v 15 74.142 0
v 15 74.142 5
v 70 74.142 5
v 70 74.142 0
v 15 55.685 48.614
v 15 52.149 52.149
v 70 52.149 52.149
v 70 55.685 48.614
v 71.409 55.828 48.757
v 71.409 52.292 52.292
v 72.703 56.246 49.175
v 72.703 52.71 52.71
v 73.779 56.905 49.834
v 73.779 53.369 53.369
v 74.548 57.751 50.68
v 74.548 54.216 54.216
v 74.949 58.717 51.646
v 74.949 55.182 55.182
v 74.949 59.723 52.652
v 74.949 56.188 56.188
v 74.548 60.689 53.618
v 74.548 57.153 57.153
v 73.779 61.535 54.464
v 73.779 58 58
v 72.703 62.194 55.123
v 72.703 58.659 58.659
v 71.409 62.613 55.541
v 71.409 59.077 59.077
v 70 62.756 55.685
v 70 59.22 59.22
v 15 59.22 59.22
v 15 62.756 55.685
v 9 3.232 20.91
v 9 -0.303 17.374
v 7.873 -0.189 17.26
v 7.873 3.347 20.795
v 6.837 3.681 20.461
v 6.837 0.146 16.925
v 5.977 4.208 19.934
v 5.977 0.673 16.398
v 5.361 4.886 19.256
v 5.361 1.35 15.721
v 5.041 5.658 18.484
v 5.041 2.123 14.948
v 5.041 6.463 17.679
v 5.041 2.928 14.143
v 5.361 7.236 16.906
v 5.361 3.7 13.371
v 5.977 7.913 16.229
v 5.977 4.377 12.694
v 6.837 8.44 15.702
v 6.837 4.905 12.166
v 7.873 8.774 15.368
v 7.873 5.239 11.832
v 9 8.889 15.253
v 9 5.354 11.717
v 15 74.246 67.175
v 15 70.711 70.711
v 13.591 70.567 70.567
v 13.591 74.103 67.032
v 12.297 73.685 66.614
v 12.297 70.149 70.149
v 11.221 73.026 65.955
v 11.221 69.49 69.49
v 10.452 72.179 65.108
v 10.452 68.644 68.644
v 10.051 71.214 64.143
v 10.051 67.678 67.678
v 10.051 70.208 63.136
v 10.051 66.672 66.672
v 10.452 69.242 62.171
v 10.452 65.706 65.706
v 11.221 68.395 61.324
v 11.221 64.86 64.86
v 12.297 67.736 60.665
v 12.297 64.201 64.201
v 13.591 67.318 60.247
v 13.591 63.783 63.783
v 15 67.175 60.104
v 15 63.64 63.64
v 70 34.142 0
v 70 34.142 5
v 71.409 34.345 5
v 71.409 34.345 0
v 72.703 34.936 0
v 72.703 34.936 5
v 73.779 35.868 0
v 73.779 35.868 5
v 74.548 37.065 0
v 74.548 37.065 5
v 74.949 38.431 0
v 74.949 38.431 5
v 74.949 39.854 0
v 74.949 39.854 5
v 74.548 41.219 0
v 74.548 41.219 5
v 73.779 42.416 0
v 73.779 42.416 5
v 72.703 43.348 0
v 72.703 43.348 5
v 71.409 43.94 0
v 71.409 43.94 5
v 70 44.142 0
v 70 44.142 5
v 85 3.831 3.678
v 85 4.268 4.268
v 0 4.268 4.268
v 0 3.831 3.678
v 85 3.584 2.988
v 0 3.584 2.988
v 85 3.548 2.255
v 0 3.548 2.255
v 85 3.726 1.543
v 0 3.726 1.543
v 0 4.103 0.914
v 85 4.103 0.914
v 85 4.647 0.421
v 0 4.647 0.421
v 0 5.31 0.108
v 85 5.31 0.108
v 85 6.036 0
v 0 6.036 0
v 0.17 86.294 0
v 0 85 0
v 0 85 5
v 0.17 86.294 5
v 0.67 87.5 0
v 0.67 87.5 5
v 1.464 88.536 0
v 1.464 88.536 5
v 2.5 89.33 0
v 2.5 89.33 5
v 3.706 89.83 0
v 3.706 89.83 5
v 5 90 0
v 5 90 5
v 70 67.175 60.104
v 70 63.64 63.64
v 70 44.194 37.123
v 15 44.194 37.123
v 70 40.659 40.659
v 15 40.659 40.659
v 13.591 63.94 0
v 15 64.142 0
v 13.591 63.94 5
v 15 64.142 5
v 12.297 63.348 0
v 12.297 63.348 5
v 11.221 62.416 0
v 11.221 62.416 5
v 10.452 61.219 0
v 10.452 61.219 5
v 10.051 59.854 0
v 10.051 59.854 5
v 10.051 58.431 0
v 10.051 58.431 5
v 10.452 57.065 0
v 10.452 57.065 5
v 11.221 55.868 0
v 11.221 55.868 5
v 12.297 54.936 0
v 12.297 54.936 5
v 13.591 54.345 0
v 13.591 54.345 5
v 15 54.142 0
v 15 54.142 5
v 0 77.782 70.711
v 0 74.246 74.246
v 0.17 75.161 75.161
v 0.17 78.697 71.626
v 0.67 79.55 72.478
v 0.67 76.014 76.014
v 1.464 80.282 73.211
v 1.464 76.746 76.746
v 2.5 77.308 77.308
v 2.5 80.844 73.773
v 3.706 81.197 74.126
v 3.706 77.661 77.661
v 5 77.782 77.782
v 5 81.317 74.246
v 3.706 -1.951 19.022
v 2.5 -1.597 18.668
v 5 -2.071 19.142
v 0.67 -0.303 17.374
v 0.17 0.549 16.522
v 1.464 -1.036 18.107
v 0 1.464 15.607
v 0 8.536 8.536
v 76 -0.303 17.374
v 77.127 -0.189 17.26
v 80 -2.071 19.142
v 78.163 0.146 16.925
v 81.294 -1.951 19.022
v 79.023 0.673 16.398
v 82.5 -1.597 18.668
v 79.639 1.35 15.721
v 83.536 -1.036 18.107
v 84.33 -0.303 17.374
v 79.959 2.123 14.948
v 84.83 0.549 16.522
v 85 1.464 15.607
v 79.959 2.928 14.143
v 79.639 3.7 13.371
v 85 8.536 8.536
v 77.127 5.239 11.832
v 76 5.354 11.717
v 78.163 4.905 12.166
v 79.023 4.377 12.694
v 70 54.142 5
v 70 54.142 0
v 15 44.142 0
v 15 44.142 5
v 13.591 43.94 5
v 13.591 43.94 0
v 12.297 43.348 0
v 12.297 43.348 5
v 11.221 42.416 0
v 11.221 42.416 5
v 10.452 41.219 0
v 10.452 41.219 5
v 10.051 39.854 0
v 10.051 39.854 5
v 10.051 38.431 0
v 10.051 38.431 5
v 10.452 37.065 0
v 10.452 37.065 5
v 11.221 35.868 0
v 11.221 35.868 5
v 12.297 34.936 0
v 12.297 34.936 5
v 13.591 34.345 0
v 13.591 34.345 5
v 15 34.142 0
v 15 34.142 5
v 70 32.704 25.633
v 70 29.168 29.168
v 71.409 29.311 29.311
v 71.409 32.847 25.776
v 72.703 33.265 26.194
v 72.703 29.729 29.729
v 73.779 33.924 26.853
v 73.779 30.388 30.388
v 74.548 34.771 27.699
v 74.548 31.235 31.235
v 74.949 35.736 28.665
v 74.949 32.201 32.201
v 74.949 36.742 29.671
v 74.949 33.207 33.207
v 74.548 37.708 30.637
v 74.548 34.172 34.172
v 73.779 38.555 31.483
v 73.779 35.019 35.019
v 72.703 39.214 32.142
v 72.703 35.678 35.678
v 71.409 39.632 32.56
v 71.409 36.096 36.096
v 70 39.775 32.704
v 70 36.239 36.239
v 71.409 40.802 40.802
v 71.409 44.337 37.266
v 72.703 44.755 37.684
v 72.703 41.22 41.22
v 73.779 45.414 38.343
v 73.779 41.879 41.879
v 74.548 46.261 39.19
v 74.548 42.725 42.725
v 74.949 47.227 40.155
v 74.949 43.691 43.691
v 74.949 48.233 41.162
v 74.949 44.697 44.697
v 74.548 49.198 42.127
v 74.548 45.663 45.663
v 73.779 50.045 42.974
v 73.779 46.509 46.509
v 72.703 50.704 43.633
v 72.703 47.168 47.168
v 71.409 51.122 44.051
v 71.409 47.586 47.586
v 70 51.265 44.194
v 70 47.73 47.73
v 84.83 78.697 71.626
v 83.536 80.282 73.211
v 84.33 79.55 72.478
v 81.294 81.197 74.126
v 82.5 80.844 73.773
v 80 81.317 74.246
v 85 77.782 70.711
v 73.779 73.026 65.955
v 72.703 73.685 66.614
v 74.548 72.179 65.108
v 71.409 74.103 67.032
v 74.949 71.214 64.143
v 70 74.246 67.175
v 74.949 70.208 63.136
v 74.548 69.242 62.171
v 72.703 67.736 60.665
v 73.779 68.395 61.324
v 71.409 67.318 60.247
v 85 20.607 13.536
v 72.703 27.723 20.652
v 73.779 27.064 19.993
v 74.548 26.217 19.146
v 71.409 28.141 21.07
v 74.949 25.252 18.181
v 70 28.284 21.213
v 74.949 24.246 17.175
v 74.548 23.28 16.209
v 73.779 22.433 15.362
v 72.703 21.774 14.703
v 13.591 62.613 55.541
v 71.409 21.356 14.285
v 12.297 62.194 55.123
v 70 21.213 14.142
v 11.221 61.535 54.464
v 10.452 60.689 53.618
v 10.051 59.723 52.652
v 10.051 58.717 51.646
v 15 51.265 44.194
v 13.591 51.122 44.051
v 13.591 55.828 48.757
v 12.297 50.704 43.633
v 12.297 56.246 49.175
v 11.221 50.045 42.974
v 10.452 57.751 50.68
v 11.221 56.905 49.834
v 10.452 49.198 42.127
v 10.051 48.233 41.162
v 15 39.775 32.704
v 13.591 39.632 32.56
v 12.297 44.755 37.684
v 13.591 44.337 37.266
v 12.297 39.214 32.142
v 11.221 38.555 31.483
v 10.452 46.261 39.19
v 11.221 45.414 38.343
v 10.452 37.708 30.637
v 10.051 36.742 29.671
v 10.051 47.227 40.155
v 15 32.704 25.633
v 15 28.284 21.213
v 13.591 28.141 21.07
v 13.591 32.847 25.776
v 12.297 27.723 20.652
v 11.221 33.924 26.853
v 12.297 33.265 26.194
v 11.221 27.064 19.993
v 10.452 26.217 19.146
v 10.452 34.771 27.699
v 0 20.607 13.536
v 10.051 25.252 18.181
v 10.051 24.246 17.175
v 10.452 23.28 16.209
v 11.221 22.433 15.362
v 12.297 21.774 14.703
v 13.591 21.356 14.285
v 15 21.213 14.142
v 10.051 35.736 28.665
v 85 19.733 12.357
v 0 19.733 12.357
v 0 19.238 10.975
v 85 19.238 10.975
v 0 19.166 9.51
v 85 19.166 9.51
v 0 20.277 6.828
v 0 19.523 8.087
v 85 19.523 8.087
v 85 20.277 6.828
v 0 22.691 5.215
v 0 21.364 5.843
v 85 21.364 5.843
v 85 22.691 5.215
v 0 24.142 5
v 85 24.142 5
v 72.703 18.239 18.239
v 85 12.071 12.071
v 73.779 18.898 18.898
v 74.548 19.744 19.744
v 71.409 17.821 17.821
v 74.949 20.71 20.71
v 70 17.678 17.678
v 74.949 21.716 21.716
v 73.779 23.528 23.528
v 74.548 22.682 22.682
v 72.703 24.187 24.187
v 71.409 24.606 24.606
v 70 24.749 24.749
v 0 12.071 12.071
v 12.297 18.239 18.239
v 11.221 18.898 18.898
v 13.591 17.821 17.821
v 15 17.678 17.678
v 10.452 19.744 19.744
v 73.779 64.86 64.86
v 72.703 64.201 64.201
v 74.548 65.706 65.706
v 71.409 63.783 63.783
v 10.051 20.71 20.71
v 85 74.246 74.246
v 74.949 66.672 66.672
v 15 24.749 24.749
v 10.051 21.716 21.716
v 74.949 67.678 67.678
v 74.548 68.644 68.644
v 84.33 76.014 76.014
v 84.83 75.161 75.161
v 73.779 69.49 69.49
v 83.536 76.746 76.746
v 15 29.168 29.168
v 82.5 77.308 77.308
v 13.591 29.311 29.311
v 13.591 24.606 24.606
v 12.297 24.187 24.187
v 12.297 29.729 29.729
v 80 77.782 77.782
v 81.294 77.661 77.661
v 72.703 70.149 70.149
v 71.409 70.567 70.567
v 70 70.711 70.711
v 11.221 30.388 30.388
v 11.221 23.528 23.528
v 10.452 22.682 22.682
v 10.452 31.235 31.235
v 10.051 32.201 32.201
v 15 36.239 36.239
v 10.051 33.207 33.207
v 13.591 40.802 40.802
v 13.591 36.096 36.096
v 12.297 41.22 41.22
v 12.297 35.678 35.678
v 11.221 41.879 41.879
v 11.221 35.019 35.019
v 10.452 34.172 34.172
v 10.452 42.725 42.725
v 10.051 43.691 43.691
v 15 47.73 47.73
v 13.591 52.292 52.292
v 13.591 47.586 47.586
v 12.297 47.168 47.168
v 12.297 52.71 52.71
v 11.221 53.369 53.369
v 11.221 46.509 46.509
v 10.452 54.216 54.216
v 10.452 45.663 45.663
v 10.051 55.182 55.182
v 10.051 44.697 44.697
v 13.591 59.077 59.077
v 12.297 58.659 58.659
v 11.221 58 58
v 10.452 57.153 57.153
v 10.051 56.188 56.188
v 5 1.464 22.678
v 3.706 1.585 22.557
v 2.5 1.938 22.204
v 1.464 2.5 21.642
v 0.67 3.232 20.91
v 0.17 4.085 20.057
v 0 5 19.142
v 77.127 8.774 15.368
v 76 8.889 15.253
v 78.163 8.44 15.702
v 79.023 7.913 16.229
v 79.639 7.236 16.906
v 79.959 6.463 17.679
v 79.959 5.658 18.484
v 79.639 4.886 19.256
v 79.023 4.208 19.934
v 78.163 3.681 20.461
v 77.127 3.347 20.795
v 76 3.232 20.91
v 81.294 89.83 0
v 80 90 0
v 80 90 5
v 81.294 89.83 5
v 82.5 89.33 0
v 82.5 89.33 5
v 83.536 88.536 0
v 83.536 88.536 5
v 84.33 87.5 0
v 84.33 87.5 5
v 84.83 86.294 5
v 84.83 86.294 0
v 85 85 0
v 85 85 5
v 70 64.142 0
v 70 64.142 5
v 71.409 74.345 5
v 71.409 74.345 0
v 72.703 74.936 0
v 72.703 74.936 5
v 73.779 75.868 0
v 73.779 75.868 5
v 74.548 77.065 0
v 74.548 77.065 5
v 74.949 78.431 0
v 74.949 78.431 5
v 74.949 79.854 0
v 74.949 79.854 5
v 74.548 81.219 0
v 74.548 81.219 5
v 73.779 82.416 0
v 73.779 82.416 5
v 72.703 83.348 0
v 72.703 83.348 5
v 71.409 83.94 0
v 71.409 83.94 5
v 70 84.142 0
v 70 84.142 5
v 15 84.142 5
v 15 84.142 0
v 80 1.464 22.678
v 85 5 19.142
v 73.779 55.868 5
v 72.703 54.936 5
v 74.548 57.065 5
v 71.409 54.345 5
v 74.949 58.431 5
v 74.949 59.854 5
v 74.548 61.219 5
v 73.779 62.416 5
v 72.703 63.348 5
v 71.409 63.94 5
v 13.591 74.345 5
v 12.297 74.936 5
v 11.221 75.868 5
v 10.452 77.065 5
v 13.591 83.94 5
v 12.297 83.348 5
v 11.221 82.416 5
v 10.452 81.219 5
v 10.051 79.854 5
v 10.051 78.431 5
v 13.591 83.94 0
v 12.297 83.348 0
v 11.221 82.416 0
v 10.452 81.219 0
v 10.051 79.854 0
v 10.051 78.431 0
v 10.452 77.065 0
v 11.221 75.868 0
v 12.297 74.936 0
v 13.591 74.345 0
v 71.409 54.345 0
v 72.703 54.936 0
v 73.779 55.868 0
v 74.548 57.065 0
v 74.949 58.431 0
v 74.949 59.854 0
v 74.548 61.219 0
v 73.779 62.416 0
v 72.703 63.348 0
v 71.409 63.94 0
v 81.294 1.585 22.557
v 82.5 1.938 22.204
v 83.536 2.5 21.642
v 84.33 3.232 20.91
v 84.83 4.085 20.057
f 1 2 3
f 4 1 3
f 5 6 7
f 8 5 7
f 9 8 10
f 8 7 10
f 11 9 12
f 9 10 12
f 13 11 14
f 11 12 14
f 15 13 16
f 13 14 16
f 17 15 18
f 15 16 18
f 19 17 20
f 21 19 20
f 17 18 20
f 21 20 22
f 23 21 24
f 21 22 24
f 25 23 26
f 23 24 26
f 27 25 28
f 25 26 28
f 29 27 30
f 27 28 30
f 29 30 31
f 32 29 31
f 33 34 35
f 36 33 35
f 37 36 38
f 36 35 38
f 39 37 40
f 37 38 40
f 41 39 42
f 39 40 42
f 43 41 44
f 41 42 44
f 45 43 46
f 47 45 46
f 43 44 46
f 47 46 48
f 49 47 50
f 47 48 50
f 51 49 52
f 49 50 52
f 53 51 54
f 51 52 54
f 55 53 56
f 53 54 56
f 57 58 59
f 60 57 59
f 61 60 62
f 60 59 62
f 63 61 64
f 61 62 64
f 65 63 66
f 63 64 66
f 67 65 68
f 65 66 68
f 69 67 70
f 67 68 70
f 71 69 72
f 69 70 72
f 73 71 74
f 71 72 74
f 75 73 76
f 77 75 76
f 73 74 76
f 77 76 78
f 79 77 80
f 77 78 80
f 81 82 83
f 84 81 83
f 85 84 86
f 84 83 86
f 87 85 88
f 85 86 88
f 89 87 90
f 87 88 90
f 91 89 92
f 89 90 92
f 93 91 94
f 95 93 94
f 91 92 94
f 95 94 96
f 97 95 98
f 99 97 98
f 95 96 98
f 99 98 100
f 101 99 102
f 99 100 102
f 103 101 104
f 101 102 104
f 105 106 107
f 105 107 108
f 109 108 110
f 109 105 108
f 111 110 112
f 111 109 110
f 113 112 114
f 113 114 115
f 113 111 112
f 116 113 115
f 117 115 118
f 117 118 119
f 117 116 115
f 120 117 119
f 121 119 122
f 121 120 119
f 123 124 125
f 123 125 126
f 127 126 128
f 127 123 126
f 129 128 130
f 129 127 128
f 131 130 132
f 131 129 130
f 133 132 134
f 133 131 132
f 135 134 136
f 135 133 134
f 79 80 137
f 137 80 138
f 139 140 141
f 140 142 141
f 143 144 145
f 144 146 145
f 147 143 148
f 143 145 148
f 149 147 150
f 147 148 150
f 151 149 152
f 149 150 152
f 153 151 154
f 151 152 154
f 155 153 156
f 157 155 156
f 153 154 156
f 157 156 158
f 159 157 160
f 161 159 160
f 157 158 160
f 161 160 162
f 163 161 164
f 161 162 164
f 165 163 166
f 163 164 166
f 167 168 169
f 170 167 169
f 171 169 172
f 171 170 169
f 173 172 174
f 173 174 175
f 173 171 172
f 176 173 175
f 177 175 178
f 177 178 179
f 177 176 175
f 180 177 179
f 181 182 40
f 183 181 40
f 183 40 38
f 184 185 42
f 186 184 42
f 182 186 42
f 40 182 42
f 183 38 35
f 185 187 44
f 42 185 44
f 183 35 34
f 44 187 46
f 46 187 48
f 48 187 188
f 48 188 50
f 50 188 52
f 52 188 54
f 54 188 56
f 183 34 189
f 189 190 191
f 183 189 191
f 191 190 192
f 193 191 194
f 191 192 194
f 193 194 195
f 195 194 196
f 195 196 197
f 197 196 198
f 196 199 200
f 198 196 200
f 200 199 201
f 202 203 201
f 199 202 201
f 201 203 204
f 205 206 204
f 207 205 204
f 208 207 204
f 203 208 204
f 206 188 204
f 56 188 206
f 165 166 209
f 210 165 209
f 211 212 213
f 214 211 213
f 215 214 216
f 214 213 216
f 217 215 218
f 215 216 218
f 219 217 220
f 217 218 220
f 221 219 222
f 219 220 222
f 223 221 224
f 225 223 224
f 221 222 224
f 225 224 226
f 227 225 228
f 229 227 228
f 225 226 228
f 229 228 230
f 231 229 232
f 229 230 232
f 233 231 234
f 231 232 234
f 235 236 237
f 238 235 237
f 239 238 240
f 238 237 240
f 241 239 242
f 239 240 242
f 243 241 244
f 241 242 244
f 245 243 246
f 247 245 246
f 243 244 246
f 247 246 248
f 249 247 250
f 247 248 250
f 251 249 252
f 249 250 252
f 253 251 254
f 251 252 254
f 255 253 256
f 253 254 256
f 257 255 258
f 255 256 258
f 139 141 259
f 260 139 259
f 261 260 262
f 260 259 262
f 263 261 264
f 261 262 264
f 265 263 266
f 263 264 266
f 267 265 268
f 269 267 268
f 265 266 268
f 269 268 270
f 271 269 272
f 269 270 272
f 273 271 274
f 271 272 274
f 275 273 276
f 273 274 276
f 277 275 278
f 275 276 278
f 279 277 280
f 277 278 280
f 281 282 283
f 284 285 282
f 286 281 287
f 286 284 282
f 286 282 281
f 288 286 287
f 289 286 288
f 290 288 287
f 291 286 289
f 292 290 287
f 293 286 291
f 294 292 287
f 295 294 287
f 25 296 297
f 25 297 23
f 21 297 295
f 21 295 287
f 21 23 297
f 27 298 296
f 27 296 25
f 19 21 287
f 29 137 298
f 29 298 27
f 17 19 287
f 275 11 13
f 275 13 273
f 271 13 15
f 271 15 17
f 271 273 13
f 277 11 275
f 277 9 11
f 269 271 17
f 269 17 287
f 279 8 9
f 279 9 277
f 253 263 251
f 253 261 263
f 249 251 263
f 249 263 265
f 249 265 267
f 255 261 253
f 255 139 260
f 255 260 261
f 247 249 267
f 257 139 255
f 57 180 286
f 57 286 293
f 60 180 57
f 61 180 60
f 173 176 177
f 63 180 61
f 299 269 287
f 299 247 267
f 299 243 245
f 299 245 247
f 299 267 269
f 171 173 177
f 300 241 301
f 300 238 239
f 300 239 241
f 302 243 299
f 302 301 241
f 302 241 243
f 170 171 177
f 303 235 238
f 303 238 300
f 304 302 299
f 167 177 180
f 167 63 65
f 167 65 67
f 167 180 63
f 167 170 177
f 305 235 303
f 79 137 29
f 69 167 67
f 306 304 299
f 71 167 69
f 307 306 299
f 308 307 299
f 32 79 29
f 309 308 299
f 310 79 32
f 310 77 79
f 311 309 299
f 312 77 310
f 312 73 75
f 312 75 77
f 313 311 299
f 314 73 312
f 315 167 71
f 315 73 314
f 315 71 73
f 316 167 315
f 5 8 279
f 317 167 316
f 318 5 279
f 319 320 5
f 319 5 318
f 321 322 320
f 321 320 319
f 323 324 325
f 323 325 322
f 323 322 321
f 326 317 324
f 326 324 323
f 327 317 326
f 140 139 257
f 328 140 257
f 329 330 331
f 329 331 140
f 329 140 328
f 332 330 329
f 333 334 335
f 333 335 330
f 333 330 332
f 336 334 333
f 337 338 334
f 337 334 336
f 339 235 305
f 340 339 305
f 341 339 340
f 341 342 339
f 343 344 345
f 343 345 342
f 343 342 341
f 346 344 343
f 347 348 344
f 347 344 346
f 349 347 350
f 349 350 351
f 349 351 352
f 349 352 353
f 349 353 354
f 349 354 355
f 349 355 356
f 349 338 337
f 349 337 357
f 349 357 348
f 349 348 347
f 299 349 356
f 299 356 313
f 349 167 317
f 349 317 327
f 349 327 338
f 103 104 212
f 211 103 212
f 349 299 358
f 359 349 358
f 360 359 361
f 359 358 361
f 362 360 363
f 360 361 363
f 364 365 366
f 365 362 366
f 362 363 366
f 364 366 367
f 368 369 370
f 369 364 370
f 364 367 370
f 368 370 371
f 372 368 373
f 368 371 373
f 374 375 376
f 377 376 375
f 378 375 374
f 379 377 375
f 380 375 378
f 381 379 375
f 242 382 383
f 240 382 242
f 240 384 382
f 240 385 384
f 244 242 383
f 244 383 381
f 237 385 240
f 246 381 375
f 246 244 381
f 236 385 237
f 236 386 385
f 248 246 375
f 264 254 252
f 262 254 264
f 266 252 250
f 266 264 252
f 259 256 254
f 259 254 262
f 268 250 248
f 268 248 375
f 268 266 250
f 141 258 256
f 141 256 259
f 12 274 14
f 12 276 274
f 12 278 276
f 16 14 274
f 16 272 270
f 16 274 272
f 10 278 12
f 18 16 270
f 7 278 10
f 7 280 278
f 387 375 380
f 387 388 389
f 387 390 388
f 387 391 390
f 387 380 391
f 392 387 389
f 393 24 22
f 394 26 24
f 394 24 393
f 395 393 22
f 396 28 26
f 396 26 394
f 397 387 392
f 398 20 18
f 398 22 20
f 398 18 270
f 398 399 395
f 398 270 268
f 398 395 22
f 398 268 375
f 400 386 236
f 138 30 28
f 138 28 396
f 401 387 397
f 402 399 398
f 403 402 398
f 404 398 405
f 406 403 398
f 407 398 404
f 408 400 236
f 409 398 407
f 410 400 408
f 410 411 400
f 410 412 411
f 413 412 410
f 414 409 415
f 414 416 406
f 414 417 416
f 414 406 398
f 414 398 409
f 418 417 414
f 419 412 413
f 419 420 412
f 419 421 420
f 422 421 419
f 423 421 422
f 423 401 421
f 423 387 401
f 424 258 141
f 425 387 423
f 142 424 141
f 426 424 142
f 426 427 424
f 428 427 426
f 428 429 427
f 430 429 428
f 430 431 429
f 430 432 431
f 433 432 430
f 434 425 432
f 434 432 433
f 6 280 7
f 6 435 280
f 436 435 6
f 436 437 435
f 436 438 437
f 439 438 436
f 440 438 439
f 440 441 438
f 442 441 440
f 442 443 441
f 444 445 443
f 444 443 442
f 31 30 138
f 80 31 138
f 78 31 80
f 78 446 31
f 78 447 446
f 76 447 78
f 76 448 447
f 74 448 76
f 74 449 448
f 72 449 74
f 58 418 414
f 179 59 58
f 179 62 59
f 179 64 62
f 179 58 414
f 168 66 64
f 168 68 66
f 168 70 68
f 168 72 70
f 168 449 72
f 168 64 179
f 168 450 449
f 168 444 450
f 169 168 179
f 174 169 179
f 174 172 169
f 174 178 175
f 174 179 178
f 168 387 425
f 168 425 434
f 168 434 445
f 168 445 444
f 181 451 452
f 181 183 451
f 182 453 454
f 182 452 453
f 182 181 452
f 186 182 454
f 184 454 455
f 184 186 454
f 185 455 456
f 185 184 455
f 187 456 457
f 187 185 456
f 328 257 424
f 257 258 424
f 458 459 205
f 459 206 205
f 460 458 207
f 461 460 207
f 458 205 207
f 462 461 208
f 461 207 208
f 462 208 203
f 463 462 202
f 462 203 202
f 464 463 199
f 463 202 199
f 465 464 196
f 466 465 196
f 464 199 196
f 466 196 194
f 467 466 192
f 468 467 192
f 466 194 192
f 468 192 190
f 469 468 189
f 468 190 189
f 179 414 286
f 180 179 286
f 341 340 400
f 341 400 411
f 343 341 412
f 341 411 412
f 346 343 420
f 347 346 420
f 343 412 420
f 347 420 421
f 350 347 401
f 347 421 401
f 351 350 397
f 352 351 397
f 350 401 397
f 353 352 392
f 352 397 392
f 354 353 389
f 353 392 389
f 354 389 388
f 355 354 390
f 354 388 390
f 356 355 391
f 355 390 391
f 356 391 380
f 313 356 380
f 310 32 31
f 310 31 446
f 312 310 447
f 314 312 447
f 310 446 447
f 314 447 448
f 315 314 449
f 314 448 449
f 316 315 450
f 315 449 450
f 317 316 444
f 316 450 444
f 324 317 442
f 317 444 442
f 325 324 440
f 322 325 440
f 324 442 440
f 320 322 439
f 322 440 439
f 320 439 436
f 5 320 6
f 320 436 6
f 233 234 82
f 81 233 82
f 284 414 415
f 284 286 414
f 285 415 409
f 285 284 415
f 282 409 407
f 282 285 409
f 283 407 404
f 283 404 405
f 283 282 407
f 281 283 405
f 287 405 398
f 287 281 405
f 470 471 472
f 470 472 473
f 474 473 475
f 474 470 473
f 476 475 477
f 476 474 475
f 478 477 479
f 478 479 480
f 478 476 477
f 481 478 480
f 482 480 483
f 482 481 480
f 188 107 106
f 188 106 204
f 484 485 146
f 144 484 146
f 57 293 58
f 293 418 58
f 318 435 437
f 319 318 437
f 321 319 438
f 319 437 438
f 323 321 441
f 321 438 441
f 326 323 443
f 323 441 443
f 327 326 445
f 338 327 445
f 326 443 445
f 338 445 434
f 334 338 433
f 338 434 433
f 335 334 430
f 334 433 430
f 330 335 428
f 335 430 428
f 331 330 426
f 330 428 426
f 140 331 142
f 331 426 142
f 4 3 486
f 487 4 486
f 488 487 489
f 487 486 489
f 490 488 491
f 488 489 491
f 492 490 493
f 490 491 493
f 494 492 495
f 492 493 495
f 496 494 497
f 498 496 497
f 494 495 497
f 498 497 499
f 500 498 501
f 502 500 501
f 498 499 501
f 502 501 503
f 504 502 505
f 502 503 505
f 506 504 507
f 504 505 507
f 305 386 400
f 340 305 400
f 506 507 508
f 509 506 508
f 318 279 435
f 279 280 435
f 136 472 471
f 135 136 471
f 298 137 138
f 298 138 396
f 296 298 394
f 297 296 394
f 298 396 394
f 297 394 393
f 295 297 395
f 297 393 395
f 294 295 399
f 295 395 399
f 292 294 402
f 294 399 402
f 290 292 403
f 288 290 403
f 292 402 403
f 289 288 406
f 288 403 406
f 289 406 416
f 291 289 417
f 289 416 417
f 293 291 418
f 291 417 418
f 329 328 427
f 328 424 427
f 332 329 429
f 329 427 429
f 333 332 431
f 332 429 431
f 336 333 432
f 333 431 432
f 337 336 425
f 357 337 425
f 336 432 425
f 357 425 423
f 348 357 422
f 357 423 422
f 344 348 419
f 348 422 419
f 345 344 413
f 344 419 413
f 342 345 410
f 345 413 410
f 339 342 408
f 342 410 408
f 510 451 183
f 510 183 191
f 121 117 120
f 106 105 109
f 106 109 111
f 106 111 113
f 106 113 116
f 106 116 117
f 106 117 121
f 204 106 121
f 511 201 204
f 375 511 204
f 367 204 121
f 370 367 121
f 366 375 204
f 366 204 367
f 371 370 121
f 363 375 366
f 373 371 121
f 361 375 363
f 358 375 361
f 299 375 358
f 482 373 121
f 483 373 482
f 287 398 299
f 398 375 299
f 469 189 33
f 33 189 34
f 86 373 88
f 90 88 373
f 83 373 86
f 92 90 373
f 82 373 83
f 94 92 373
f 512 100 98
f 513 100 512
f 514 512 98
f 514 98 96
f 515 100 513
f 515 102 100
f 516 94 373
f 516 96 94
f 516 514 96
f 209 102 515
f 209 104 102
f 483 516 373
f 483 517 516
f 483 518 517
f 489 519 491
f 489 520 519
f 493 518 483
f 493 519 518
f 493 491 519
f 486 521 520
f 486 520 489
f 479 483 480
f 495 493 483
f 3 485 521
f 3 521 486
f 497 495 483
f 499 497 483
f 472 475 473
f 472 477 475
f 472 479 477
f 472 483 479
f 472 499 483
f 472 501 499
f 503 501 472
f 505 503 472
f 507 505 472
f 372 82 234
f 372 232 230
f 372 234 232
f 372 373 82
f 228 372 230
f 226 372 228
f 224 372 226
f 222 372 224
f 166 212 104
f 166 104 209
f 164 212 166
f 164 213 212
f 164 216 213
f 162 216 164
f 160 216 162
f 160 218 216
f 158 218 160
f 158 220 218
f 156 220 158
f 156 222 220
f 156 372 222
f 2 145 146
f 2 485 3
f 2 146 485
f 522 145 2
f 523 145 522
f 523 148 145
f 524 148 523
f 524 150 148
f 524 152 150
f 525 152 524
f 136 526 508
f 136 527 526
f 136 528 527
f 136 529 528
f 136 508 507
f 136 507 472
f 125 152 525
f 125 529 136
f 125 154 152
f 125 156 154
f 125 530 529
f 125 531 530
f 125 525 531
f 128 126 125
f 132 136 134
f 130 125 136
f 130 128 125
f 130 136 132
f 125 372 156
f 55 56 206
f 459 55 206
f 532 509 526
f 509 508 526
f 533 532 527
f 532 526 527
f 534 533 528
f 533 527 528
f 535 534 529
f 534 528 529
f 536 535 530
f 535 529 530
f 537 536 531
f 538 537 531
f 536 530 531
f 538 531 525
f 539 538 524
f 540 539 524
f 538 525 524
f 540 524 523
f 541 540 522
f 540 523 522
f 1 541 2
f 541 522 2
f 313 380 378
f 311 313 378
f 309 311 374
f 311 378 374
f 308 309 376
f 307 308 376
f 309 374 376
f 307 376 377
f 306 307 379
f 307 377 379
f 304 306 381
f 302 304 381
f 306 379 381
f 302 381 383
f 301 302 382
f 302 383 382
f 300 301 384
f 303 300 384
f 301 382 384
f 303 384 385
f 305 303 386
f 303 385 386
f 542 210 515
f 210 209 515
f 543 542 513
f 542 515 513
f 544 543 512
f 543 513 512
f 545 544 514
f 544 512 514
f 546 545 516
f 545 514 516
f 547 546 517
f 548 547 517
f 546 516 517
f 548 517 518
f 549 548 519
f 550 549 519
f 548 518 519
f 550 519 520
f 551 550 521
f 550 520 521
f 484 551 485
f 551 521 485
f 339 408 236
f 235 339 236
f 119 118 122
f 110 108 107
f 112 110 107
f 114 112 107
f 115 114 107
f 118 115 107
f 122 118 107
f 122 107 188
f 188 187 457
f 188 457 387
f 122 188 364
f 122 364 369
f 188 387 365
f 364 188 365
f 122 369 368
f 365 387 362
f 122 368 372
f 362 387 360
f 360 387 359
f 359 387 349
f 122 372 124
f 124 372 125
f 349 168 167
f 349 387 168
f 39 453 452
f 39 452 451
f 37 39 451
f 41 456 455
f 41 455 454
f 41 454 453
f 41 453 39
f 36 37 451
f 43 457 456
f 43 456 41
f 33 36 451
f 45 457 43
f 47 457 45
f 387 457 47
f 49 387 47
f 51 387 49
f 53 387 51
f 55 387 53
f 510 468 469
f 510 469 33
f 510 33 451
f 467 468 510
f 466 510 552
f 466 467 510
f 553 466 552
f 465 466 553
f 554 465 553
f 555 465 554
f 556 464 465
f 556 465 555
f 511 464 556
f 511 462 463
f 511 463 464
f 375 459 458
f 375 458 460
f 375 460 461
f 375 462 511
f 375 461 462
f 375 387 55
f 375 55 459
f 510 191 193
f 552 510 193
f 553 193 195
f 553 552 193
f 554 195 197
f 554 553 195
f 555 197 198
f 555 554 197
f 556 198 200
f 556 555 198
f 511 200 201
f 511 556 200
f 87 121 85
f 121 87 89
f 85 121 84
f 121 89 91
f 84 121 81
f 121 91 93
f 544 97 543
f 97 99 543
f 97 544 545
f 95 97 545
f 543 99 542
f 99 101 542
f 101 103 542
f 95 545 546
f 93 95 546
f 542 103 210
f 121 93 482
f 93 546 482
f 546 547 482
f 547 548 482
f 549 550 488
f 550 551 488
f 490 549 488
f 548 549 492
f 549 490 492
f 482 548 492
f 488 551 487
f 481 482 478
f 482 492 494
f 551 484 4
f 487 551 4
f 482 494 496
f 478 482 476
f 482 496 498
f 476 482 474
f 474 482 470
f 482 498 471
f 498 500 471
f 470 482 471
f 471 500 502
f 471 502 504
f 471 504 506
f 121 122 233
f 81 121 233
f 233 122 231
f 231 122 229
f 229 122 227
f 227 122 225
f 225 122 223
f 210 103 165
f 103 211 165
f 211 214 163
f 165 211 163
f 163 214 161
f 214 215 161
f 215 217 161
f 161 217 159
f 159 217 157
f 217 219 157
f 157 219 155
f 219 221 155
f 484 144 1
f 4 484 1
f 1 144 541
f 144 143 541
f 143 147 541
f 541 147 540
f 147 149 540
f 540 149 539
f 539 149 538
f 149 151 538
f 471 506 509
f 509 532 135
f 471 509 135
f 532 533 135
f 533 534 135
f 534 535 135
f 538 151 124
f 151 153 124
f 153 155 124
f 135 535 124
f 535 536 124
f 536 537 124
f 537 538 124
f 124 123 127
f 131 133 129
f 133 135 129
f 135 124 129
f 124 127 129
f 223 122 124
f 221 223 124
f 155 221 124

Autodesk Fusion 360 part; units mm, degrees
sketch "Sketch1" plane through (0, 0, 0) normal (1, 0, 0) x (0, 1, 0)
  line L0 (0, 0) -> (90, 0)
  line L1 (0, 0) -> (77.7817, 77.7817)
  line L2 (77.7817, 77.7817) -> (81.3173, 74.2462)
  line L3 (81.3173, 74.2462) -> (12.0711, 5)
  line L4 (12.0711, 5) -> (90, 5)
  line L5 (90, 5) -> (90, 0)
  dimension "d1" = 110
  dimension "d2" = 5
  dimension "d3" = 5
  dimension "d4" = 45
  dimension "d5" = 90
extrude "Extrude1" add sketch "Sketch1" along normal blind 85
sketch "Sketch2" plane through (0, 0, 0) normal (0, -0.7071, 0.7071) x (1, 0, 0)
  line L0 (0, 110) -> (0, 0)
  line L1 (0, 0) -> (85, 0)
  line L2 (85, 0) -> (85, 110)
  line L3 (85, 110) -> (0, 110)
  line L4 (0, 12.0711) -> (85, 12.0711)
  line L5 (0, 0) -> (85, 0)
  line L6 (0, 17.0711) -> (85, 17.0711)
  line L7 (42.5, 17.0711) -> (42.5, 110) construction
  line L8 (42.5, 63.5355) -> (0, 63.5355) construction
  line L9 (15, 90) -> (70, 90)
  arc A0 (70, 90) -> (70, 100) centre (70, 95) ccw
  line L10 (70, 100) -> (15, 100)
  arc A1 (15, 100) -> (15, 90) centre (15, 95) ccw
  line L11 (15, 95) -> (70, 95) construction
  line L12 (70, 83.75) -> (15, 83.75)
  arc A2 (15, 83.75) -> (15, 73.75) centre (15, 78.75) ccw
  line L13 (15, 73.75) -> (70, 73.75)
  arc A3 (70, 73.75) -> (70, 83.75) centre (70, 78.75) ccw
  line L14 (70, 67.5) -> (15, 67.5)
  arc A4 (15, 67.5) -> (15, 57.5) centre (15, 62.5) ccw
  line L15 (15, 57.5) -> (70, 57.5)
  arc A5 (70, 57.5) -> (70, 67.5) centre (70, 62.5) ccw
  line L16 (70, 51.25) -> (15, 51.25)
  arc A6 (15, 51.25) -> (15, 41.25) centre (15, 46.25) ccw
  line L17 (15, 41.25) -> (70, 41.25)
  arc A7 (70, 41.25) -> (70, 51.25) centre (70, 46.25) ccw
  line L18 (70, 35) -> (15, 35)
  arc A8 (15, 35) -> (15, 25) centre (15, 30) ccw
  line L19 (15, 25) -> (70, 25)
  arc A9 (70, 25) -> (70, 35) centre (70, 30) ccw
  dimension "d8" = 5
  dimension "d51" = 10
  dimension "d52" = 10
  dimension "d53" = 10
  dimension "d54" = 5
  dimension "d57" = 0
  dimension "d58" = -65
extrude "Extrude2" add sketch "Sketch2" along normal blind 15 contours L0 L2 L4 L6
fillet "Fillet1" radius 2.5 1 edges at (42.5, 0, 0)
fillet "Fillet3" radius 5 1 edges at (42.5, 12.0711, 5)
fillet "Fillet4" radius 5 2 edges at (0, 79.5495, 76.014) (85, 79.5495, 76.014)
fillet "Fillet5" radius 5 2 edges at (85, -0.3033, 20.9099) (0, -0.3033, 20.9099)
sketch "Sketch3" plane through (0, 0, 5) normal (0, 0, 1) x (-1, 0, 0)
  line L0 (0, -24.1421) -> (-85, -24.1421)
  line L1 (-85, -24.1421) -> (-85, -90)
  line L2 (-85, -90) -> (0, -90)
  line L3 (0, -90) -> (0, -24.1421)
  line L4 (-42.5, -24.1421) -> (-42.5, -90) construction
  line L5 (-42.5, -57.0711) -> (-85, -57.0711) construction
  line L6 (-70, -44.1421) -> (-15, -44.1421)
  arc A0 (-15, -44.1421) -> (-15, -34.1421) centre (-15, -39.1421) ccw
  line L7 (-15, -34.1421) -> (-70, -34.1421)
  arc A1 (-70, -34.1421) -> (-70, -44.1421) centre (-70, -39.1421) ccw
  line L8 (-70, -39.1421) -> (-15, -39.1421) construction
  line L9 (-15, -54.1421) -> (-70, -54.1421)
  arc A2 (-70, -54.1421) -> (-70, -64.1421) centre (-70, -59.1421) ccw
  line L10 (-70, -64.1421) -> (-15, -64.1421)
  arc A3 (-15, -64.1421) -> (-15, -54.1421) centre (-15, -59.1421) ccw
  line L11 (-15, -74.1421) -> (-70, -74.1421)
  arc A4 (-70, -74.1421) -> (-70, -84.1421) centre (-70, -79.1421) ccw
  line L12 (-70, -84.1421) -> (-15, -84.1421)
  arc A5 (-15, -84.1421) -> (-15, -74.1421) centre (-15, -79.1421) ccw
  dimension "d61" = 10
  dimension "d62" = 10
  dimension "d63" = 10
  dimension "d64" = 5
  dimension "d67" = 0
  dimension "d68" = -40
fillet "Fillet6" radius 5 2 edges at (85, 90, 2.5) (0, 90, 2.5)
sketch "Sketch4" plane through (0, 8.5355, 8.5355) normal (0, -0.7071, -0.7071) x (1, 0, 0)
  arc A0 (5, 15) -> (0, 10) centre (5, 10) ccw
  line L0 (0, 10) -> (0, 0)
  line L1 (85, 0) -> (85, 10)
  arc A1 (85, 10) -> (80, 15) centre (80, 10) ccw
  line L2 (80, 15) -> (5, 15)
  line L3 (9, 4.5) -> (76, 4.5)
  arc A2 (76, 4.5) -> (76, 12.5) centre (76, 8.5) ccw
  line L4 (76, 12.5) -> (9, 12.5)
  arc A3 (9, 12.5) -> (9, 4.5) centre (9, 8.5) ccw
  line L5 (9, 8.5) -> (76, 8.5) construction
  line L6 (0, 0) -> (85, 0)
  dimension "d43" = 5
  dimension "d44" = 5
  dimension "d47" = 8
extrude "Extrude5" cut sketch "Sketch4" against normal up to surface (5 mm away) contours L3 A2 L4 A3
extrude "Extrude6" cut sketch "Sketch2" against normal up to surface (5 mm away) contours L9 A0 L10 A1 | L12 A2 L13 A3 | L14 A4 L15 A5 | L16 A6 L17 A7 | L18 A8 L19 A9
extrude "Extrude7" cut sketch "Sketch3" against normal up to surface (5 mm away) contours L6 A0 L7 A1 | L9 A2 L10 A3 | L11 A4 L12 A5
